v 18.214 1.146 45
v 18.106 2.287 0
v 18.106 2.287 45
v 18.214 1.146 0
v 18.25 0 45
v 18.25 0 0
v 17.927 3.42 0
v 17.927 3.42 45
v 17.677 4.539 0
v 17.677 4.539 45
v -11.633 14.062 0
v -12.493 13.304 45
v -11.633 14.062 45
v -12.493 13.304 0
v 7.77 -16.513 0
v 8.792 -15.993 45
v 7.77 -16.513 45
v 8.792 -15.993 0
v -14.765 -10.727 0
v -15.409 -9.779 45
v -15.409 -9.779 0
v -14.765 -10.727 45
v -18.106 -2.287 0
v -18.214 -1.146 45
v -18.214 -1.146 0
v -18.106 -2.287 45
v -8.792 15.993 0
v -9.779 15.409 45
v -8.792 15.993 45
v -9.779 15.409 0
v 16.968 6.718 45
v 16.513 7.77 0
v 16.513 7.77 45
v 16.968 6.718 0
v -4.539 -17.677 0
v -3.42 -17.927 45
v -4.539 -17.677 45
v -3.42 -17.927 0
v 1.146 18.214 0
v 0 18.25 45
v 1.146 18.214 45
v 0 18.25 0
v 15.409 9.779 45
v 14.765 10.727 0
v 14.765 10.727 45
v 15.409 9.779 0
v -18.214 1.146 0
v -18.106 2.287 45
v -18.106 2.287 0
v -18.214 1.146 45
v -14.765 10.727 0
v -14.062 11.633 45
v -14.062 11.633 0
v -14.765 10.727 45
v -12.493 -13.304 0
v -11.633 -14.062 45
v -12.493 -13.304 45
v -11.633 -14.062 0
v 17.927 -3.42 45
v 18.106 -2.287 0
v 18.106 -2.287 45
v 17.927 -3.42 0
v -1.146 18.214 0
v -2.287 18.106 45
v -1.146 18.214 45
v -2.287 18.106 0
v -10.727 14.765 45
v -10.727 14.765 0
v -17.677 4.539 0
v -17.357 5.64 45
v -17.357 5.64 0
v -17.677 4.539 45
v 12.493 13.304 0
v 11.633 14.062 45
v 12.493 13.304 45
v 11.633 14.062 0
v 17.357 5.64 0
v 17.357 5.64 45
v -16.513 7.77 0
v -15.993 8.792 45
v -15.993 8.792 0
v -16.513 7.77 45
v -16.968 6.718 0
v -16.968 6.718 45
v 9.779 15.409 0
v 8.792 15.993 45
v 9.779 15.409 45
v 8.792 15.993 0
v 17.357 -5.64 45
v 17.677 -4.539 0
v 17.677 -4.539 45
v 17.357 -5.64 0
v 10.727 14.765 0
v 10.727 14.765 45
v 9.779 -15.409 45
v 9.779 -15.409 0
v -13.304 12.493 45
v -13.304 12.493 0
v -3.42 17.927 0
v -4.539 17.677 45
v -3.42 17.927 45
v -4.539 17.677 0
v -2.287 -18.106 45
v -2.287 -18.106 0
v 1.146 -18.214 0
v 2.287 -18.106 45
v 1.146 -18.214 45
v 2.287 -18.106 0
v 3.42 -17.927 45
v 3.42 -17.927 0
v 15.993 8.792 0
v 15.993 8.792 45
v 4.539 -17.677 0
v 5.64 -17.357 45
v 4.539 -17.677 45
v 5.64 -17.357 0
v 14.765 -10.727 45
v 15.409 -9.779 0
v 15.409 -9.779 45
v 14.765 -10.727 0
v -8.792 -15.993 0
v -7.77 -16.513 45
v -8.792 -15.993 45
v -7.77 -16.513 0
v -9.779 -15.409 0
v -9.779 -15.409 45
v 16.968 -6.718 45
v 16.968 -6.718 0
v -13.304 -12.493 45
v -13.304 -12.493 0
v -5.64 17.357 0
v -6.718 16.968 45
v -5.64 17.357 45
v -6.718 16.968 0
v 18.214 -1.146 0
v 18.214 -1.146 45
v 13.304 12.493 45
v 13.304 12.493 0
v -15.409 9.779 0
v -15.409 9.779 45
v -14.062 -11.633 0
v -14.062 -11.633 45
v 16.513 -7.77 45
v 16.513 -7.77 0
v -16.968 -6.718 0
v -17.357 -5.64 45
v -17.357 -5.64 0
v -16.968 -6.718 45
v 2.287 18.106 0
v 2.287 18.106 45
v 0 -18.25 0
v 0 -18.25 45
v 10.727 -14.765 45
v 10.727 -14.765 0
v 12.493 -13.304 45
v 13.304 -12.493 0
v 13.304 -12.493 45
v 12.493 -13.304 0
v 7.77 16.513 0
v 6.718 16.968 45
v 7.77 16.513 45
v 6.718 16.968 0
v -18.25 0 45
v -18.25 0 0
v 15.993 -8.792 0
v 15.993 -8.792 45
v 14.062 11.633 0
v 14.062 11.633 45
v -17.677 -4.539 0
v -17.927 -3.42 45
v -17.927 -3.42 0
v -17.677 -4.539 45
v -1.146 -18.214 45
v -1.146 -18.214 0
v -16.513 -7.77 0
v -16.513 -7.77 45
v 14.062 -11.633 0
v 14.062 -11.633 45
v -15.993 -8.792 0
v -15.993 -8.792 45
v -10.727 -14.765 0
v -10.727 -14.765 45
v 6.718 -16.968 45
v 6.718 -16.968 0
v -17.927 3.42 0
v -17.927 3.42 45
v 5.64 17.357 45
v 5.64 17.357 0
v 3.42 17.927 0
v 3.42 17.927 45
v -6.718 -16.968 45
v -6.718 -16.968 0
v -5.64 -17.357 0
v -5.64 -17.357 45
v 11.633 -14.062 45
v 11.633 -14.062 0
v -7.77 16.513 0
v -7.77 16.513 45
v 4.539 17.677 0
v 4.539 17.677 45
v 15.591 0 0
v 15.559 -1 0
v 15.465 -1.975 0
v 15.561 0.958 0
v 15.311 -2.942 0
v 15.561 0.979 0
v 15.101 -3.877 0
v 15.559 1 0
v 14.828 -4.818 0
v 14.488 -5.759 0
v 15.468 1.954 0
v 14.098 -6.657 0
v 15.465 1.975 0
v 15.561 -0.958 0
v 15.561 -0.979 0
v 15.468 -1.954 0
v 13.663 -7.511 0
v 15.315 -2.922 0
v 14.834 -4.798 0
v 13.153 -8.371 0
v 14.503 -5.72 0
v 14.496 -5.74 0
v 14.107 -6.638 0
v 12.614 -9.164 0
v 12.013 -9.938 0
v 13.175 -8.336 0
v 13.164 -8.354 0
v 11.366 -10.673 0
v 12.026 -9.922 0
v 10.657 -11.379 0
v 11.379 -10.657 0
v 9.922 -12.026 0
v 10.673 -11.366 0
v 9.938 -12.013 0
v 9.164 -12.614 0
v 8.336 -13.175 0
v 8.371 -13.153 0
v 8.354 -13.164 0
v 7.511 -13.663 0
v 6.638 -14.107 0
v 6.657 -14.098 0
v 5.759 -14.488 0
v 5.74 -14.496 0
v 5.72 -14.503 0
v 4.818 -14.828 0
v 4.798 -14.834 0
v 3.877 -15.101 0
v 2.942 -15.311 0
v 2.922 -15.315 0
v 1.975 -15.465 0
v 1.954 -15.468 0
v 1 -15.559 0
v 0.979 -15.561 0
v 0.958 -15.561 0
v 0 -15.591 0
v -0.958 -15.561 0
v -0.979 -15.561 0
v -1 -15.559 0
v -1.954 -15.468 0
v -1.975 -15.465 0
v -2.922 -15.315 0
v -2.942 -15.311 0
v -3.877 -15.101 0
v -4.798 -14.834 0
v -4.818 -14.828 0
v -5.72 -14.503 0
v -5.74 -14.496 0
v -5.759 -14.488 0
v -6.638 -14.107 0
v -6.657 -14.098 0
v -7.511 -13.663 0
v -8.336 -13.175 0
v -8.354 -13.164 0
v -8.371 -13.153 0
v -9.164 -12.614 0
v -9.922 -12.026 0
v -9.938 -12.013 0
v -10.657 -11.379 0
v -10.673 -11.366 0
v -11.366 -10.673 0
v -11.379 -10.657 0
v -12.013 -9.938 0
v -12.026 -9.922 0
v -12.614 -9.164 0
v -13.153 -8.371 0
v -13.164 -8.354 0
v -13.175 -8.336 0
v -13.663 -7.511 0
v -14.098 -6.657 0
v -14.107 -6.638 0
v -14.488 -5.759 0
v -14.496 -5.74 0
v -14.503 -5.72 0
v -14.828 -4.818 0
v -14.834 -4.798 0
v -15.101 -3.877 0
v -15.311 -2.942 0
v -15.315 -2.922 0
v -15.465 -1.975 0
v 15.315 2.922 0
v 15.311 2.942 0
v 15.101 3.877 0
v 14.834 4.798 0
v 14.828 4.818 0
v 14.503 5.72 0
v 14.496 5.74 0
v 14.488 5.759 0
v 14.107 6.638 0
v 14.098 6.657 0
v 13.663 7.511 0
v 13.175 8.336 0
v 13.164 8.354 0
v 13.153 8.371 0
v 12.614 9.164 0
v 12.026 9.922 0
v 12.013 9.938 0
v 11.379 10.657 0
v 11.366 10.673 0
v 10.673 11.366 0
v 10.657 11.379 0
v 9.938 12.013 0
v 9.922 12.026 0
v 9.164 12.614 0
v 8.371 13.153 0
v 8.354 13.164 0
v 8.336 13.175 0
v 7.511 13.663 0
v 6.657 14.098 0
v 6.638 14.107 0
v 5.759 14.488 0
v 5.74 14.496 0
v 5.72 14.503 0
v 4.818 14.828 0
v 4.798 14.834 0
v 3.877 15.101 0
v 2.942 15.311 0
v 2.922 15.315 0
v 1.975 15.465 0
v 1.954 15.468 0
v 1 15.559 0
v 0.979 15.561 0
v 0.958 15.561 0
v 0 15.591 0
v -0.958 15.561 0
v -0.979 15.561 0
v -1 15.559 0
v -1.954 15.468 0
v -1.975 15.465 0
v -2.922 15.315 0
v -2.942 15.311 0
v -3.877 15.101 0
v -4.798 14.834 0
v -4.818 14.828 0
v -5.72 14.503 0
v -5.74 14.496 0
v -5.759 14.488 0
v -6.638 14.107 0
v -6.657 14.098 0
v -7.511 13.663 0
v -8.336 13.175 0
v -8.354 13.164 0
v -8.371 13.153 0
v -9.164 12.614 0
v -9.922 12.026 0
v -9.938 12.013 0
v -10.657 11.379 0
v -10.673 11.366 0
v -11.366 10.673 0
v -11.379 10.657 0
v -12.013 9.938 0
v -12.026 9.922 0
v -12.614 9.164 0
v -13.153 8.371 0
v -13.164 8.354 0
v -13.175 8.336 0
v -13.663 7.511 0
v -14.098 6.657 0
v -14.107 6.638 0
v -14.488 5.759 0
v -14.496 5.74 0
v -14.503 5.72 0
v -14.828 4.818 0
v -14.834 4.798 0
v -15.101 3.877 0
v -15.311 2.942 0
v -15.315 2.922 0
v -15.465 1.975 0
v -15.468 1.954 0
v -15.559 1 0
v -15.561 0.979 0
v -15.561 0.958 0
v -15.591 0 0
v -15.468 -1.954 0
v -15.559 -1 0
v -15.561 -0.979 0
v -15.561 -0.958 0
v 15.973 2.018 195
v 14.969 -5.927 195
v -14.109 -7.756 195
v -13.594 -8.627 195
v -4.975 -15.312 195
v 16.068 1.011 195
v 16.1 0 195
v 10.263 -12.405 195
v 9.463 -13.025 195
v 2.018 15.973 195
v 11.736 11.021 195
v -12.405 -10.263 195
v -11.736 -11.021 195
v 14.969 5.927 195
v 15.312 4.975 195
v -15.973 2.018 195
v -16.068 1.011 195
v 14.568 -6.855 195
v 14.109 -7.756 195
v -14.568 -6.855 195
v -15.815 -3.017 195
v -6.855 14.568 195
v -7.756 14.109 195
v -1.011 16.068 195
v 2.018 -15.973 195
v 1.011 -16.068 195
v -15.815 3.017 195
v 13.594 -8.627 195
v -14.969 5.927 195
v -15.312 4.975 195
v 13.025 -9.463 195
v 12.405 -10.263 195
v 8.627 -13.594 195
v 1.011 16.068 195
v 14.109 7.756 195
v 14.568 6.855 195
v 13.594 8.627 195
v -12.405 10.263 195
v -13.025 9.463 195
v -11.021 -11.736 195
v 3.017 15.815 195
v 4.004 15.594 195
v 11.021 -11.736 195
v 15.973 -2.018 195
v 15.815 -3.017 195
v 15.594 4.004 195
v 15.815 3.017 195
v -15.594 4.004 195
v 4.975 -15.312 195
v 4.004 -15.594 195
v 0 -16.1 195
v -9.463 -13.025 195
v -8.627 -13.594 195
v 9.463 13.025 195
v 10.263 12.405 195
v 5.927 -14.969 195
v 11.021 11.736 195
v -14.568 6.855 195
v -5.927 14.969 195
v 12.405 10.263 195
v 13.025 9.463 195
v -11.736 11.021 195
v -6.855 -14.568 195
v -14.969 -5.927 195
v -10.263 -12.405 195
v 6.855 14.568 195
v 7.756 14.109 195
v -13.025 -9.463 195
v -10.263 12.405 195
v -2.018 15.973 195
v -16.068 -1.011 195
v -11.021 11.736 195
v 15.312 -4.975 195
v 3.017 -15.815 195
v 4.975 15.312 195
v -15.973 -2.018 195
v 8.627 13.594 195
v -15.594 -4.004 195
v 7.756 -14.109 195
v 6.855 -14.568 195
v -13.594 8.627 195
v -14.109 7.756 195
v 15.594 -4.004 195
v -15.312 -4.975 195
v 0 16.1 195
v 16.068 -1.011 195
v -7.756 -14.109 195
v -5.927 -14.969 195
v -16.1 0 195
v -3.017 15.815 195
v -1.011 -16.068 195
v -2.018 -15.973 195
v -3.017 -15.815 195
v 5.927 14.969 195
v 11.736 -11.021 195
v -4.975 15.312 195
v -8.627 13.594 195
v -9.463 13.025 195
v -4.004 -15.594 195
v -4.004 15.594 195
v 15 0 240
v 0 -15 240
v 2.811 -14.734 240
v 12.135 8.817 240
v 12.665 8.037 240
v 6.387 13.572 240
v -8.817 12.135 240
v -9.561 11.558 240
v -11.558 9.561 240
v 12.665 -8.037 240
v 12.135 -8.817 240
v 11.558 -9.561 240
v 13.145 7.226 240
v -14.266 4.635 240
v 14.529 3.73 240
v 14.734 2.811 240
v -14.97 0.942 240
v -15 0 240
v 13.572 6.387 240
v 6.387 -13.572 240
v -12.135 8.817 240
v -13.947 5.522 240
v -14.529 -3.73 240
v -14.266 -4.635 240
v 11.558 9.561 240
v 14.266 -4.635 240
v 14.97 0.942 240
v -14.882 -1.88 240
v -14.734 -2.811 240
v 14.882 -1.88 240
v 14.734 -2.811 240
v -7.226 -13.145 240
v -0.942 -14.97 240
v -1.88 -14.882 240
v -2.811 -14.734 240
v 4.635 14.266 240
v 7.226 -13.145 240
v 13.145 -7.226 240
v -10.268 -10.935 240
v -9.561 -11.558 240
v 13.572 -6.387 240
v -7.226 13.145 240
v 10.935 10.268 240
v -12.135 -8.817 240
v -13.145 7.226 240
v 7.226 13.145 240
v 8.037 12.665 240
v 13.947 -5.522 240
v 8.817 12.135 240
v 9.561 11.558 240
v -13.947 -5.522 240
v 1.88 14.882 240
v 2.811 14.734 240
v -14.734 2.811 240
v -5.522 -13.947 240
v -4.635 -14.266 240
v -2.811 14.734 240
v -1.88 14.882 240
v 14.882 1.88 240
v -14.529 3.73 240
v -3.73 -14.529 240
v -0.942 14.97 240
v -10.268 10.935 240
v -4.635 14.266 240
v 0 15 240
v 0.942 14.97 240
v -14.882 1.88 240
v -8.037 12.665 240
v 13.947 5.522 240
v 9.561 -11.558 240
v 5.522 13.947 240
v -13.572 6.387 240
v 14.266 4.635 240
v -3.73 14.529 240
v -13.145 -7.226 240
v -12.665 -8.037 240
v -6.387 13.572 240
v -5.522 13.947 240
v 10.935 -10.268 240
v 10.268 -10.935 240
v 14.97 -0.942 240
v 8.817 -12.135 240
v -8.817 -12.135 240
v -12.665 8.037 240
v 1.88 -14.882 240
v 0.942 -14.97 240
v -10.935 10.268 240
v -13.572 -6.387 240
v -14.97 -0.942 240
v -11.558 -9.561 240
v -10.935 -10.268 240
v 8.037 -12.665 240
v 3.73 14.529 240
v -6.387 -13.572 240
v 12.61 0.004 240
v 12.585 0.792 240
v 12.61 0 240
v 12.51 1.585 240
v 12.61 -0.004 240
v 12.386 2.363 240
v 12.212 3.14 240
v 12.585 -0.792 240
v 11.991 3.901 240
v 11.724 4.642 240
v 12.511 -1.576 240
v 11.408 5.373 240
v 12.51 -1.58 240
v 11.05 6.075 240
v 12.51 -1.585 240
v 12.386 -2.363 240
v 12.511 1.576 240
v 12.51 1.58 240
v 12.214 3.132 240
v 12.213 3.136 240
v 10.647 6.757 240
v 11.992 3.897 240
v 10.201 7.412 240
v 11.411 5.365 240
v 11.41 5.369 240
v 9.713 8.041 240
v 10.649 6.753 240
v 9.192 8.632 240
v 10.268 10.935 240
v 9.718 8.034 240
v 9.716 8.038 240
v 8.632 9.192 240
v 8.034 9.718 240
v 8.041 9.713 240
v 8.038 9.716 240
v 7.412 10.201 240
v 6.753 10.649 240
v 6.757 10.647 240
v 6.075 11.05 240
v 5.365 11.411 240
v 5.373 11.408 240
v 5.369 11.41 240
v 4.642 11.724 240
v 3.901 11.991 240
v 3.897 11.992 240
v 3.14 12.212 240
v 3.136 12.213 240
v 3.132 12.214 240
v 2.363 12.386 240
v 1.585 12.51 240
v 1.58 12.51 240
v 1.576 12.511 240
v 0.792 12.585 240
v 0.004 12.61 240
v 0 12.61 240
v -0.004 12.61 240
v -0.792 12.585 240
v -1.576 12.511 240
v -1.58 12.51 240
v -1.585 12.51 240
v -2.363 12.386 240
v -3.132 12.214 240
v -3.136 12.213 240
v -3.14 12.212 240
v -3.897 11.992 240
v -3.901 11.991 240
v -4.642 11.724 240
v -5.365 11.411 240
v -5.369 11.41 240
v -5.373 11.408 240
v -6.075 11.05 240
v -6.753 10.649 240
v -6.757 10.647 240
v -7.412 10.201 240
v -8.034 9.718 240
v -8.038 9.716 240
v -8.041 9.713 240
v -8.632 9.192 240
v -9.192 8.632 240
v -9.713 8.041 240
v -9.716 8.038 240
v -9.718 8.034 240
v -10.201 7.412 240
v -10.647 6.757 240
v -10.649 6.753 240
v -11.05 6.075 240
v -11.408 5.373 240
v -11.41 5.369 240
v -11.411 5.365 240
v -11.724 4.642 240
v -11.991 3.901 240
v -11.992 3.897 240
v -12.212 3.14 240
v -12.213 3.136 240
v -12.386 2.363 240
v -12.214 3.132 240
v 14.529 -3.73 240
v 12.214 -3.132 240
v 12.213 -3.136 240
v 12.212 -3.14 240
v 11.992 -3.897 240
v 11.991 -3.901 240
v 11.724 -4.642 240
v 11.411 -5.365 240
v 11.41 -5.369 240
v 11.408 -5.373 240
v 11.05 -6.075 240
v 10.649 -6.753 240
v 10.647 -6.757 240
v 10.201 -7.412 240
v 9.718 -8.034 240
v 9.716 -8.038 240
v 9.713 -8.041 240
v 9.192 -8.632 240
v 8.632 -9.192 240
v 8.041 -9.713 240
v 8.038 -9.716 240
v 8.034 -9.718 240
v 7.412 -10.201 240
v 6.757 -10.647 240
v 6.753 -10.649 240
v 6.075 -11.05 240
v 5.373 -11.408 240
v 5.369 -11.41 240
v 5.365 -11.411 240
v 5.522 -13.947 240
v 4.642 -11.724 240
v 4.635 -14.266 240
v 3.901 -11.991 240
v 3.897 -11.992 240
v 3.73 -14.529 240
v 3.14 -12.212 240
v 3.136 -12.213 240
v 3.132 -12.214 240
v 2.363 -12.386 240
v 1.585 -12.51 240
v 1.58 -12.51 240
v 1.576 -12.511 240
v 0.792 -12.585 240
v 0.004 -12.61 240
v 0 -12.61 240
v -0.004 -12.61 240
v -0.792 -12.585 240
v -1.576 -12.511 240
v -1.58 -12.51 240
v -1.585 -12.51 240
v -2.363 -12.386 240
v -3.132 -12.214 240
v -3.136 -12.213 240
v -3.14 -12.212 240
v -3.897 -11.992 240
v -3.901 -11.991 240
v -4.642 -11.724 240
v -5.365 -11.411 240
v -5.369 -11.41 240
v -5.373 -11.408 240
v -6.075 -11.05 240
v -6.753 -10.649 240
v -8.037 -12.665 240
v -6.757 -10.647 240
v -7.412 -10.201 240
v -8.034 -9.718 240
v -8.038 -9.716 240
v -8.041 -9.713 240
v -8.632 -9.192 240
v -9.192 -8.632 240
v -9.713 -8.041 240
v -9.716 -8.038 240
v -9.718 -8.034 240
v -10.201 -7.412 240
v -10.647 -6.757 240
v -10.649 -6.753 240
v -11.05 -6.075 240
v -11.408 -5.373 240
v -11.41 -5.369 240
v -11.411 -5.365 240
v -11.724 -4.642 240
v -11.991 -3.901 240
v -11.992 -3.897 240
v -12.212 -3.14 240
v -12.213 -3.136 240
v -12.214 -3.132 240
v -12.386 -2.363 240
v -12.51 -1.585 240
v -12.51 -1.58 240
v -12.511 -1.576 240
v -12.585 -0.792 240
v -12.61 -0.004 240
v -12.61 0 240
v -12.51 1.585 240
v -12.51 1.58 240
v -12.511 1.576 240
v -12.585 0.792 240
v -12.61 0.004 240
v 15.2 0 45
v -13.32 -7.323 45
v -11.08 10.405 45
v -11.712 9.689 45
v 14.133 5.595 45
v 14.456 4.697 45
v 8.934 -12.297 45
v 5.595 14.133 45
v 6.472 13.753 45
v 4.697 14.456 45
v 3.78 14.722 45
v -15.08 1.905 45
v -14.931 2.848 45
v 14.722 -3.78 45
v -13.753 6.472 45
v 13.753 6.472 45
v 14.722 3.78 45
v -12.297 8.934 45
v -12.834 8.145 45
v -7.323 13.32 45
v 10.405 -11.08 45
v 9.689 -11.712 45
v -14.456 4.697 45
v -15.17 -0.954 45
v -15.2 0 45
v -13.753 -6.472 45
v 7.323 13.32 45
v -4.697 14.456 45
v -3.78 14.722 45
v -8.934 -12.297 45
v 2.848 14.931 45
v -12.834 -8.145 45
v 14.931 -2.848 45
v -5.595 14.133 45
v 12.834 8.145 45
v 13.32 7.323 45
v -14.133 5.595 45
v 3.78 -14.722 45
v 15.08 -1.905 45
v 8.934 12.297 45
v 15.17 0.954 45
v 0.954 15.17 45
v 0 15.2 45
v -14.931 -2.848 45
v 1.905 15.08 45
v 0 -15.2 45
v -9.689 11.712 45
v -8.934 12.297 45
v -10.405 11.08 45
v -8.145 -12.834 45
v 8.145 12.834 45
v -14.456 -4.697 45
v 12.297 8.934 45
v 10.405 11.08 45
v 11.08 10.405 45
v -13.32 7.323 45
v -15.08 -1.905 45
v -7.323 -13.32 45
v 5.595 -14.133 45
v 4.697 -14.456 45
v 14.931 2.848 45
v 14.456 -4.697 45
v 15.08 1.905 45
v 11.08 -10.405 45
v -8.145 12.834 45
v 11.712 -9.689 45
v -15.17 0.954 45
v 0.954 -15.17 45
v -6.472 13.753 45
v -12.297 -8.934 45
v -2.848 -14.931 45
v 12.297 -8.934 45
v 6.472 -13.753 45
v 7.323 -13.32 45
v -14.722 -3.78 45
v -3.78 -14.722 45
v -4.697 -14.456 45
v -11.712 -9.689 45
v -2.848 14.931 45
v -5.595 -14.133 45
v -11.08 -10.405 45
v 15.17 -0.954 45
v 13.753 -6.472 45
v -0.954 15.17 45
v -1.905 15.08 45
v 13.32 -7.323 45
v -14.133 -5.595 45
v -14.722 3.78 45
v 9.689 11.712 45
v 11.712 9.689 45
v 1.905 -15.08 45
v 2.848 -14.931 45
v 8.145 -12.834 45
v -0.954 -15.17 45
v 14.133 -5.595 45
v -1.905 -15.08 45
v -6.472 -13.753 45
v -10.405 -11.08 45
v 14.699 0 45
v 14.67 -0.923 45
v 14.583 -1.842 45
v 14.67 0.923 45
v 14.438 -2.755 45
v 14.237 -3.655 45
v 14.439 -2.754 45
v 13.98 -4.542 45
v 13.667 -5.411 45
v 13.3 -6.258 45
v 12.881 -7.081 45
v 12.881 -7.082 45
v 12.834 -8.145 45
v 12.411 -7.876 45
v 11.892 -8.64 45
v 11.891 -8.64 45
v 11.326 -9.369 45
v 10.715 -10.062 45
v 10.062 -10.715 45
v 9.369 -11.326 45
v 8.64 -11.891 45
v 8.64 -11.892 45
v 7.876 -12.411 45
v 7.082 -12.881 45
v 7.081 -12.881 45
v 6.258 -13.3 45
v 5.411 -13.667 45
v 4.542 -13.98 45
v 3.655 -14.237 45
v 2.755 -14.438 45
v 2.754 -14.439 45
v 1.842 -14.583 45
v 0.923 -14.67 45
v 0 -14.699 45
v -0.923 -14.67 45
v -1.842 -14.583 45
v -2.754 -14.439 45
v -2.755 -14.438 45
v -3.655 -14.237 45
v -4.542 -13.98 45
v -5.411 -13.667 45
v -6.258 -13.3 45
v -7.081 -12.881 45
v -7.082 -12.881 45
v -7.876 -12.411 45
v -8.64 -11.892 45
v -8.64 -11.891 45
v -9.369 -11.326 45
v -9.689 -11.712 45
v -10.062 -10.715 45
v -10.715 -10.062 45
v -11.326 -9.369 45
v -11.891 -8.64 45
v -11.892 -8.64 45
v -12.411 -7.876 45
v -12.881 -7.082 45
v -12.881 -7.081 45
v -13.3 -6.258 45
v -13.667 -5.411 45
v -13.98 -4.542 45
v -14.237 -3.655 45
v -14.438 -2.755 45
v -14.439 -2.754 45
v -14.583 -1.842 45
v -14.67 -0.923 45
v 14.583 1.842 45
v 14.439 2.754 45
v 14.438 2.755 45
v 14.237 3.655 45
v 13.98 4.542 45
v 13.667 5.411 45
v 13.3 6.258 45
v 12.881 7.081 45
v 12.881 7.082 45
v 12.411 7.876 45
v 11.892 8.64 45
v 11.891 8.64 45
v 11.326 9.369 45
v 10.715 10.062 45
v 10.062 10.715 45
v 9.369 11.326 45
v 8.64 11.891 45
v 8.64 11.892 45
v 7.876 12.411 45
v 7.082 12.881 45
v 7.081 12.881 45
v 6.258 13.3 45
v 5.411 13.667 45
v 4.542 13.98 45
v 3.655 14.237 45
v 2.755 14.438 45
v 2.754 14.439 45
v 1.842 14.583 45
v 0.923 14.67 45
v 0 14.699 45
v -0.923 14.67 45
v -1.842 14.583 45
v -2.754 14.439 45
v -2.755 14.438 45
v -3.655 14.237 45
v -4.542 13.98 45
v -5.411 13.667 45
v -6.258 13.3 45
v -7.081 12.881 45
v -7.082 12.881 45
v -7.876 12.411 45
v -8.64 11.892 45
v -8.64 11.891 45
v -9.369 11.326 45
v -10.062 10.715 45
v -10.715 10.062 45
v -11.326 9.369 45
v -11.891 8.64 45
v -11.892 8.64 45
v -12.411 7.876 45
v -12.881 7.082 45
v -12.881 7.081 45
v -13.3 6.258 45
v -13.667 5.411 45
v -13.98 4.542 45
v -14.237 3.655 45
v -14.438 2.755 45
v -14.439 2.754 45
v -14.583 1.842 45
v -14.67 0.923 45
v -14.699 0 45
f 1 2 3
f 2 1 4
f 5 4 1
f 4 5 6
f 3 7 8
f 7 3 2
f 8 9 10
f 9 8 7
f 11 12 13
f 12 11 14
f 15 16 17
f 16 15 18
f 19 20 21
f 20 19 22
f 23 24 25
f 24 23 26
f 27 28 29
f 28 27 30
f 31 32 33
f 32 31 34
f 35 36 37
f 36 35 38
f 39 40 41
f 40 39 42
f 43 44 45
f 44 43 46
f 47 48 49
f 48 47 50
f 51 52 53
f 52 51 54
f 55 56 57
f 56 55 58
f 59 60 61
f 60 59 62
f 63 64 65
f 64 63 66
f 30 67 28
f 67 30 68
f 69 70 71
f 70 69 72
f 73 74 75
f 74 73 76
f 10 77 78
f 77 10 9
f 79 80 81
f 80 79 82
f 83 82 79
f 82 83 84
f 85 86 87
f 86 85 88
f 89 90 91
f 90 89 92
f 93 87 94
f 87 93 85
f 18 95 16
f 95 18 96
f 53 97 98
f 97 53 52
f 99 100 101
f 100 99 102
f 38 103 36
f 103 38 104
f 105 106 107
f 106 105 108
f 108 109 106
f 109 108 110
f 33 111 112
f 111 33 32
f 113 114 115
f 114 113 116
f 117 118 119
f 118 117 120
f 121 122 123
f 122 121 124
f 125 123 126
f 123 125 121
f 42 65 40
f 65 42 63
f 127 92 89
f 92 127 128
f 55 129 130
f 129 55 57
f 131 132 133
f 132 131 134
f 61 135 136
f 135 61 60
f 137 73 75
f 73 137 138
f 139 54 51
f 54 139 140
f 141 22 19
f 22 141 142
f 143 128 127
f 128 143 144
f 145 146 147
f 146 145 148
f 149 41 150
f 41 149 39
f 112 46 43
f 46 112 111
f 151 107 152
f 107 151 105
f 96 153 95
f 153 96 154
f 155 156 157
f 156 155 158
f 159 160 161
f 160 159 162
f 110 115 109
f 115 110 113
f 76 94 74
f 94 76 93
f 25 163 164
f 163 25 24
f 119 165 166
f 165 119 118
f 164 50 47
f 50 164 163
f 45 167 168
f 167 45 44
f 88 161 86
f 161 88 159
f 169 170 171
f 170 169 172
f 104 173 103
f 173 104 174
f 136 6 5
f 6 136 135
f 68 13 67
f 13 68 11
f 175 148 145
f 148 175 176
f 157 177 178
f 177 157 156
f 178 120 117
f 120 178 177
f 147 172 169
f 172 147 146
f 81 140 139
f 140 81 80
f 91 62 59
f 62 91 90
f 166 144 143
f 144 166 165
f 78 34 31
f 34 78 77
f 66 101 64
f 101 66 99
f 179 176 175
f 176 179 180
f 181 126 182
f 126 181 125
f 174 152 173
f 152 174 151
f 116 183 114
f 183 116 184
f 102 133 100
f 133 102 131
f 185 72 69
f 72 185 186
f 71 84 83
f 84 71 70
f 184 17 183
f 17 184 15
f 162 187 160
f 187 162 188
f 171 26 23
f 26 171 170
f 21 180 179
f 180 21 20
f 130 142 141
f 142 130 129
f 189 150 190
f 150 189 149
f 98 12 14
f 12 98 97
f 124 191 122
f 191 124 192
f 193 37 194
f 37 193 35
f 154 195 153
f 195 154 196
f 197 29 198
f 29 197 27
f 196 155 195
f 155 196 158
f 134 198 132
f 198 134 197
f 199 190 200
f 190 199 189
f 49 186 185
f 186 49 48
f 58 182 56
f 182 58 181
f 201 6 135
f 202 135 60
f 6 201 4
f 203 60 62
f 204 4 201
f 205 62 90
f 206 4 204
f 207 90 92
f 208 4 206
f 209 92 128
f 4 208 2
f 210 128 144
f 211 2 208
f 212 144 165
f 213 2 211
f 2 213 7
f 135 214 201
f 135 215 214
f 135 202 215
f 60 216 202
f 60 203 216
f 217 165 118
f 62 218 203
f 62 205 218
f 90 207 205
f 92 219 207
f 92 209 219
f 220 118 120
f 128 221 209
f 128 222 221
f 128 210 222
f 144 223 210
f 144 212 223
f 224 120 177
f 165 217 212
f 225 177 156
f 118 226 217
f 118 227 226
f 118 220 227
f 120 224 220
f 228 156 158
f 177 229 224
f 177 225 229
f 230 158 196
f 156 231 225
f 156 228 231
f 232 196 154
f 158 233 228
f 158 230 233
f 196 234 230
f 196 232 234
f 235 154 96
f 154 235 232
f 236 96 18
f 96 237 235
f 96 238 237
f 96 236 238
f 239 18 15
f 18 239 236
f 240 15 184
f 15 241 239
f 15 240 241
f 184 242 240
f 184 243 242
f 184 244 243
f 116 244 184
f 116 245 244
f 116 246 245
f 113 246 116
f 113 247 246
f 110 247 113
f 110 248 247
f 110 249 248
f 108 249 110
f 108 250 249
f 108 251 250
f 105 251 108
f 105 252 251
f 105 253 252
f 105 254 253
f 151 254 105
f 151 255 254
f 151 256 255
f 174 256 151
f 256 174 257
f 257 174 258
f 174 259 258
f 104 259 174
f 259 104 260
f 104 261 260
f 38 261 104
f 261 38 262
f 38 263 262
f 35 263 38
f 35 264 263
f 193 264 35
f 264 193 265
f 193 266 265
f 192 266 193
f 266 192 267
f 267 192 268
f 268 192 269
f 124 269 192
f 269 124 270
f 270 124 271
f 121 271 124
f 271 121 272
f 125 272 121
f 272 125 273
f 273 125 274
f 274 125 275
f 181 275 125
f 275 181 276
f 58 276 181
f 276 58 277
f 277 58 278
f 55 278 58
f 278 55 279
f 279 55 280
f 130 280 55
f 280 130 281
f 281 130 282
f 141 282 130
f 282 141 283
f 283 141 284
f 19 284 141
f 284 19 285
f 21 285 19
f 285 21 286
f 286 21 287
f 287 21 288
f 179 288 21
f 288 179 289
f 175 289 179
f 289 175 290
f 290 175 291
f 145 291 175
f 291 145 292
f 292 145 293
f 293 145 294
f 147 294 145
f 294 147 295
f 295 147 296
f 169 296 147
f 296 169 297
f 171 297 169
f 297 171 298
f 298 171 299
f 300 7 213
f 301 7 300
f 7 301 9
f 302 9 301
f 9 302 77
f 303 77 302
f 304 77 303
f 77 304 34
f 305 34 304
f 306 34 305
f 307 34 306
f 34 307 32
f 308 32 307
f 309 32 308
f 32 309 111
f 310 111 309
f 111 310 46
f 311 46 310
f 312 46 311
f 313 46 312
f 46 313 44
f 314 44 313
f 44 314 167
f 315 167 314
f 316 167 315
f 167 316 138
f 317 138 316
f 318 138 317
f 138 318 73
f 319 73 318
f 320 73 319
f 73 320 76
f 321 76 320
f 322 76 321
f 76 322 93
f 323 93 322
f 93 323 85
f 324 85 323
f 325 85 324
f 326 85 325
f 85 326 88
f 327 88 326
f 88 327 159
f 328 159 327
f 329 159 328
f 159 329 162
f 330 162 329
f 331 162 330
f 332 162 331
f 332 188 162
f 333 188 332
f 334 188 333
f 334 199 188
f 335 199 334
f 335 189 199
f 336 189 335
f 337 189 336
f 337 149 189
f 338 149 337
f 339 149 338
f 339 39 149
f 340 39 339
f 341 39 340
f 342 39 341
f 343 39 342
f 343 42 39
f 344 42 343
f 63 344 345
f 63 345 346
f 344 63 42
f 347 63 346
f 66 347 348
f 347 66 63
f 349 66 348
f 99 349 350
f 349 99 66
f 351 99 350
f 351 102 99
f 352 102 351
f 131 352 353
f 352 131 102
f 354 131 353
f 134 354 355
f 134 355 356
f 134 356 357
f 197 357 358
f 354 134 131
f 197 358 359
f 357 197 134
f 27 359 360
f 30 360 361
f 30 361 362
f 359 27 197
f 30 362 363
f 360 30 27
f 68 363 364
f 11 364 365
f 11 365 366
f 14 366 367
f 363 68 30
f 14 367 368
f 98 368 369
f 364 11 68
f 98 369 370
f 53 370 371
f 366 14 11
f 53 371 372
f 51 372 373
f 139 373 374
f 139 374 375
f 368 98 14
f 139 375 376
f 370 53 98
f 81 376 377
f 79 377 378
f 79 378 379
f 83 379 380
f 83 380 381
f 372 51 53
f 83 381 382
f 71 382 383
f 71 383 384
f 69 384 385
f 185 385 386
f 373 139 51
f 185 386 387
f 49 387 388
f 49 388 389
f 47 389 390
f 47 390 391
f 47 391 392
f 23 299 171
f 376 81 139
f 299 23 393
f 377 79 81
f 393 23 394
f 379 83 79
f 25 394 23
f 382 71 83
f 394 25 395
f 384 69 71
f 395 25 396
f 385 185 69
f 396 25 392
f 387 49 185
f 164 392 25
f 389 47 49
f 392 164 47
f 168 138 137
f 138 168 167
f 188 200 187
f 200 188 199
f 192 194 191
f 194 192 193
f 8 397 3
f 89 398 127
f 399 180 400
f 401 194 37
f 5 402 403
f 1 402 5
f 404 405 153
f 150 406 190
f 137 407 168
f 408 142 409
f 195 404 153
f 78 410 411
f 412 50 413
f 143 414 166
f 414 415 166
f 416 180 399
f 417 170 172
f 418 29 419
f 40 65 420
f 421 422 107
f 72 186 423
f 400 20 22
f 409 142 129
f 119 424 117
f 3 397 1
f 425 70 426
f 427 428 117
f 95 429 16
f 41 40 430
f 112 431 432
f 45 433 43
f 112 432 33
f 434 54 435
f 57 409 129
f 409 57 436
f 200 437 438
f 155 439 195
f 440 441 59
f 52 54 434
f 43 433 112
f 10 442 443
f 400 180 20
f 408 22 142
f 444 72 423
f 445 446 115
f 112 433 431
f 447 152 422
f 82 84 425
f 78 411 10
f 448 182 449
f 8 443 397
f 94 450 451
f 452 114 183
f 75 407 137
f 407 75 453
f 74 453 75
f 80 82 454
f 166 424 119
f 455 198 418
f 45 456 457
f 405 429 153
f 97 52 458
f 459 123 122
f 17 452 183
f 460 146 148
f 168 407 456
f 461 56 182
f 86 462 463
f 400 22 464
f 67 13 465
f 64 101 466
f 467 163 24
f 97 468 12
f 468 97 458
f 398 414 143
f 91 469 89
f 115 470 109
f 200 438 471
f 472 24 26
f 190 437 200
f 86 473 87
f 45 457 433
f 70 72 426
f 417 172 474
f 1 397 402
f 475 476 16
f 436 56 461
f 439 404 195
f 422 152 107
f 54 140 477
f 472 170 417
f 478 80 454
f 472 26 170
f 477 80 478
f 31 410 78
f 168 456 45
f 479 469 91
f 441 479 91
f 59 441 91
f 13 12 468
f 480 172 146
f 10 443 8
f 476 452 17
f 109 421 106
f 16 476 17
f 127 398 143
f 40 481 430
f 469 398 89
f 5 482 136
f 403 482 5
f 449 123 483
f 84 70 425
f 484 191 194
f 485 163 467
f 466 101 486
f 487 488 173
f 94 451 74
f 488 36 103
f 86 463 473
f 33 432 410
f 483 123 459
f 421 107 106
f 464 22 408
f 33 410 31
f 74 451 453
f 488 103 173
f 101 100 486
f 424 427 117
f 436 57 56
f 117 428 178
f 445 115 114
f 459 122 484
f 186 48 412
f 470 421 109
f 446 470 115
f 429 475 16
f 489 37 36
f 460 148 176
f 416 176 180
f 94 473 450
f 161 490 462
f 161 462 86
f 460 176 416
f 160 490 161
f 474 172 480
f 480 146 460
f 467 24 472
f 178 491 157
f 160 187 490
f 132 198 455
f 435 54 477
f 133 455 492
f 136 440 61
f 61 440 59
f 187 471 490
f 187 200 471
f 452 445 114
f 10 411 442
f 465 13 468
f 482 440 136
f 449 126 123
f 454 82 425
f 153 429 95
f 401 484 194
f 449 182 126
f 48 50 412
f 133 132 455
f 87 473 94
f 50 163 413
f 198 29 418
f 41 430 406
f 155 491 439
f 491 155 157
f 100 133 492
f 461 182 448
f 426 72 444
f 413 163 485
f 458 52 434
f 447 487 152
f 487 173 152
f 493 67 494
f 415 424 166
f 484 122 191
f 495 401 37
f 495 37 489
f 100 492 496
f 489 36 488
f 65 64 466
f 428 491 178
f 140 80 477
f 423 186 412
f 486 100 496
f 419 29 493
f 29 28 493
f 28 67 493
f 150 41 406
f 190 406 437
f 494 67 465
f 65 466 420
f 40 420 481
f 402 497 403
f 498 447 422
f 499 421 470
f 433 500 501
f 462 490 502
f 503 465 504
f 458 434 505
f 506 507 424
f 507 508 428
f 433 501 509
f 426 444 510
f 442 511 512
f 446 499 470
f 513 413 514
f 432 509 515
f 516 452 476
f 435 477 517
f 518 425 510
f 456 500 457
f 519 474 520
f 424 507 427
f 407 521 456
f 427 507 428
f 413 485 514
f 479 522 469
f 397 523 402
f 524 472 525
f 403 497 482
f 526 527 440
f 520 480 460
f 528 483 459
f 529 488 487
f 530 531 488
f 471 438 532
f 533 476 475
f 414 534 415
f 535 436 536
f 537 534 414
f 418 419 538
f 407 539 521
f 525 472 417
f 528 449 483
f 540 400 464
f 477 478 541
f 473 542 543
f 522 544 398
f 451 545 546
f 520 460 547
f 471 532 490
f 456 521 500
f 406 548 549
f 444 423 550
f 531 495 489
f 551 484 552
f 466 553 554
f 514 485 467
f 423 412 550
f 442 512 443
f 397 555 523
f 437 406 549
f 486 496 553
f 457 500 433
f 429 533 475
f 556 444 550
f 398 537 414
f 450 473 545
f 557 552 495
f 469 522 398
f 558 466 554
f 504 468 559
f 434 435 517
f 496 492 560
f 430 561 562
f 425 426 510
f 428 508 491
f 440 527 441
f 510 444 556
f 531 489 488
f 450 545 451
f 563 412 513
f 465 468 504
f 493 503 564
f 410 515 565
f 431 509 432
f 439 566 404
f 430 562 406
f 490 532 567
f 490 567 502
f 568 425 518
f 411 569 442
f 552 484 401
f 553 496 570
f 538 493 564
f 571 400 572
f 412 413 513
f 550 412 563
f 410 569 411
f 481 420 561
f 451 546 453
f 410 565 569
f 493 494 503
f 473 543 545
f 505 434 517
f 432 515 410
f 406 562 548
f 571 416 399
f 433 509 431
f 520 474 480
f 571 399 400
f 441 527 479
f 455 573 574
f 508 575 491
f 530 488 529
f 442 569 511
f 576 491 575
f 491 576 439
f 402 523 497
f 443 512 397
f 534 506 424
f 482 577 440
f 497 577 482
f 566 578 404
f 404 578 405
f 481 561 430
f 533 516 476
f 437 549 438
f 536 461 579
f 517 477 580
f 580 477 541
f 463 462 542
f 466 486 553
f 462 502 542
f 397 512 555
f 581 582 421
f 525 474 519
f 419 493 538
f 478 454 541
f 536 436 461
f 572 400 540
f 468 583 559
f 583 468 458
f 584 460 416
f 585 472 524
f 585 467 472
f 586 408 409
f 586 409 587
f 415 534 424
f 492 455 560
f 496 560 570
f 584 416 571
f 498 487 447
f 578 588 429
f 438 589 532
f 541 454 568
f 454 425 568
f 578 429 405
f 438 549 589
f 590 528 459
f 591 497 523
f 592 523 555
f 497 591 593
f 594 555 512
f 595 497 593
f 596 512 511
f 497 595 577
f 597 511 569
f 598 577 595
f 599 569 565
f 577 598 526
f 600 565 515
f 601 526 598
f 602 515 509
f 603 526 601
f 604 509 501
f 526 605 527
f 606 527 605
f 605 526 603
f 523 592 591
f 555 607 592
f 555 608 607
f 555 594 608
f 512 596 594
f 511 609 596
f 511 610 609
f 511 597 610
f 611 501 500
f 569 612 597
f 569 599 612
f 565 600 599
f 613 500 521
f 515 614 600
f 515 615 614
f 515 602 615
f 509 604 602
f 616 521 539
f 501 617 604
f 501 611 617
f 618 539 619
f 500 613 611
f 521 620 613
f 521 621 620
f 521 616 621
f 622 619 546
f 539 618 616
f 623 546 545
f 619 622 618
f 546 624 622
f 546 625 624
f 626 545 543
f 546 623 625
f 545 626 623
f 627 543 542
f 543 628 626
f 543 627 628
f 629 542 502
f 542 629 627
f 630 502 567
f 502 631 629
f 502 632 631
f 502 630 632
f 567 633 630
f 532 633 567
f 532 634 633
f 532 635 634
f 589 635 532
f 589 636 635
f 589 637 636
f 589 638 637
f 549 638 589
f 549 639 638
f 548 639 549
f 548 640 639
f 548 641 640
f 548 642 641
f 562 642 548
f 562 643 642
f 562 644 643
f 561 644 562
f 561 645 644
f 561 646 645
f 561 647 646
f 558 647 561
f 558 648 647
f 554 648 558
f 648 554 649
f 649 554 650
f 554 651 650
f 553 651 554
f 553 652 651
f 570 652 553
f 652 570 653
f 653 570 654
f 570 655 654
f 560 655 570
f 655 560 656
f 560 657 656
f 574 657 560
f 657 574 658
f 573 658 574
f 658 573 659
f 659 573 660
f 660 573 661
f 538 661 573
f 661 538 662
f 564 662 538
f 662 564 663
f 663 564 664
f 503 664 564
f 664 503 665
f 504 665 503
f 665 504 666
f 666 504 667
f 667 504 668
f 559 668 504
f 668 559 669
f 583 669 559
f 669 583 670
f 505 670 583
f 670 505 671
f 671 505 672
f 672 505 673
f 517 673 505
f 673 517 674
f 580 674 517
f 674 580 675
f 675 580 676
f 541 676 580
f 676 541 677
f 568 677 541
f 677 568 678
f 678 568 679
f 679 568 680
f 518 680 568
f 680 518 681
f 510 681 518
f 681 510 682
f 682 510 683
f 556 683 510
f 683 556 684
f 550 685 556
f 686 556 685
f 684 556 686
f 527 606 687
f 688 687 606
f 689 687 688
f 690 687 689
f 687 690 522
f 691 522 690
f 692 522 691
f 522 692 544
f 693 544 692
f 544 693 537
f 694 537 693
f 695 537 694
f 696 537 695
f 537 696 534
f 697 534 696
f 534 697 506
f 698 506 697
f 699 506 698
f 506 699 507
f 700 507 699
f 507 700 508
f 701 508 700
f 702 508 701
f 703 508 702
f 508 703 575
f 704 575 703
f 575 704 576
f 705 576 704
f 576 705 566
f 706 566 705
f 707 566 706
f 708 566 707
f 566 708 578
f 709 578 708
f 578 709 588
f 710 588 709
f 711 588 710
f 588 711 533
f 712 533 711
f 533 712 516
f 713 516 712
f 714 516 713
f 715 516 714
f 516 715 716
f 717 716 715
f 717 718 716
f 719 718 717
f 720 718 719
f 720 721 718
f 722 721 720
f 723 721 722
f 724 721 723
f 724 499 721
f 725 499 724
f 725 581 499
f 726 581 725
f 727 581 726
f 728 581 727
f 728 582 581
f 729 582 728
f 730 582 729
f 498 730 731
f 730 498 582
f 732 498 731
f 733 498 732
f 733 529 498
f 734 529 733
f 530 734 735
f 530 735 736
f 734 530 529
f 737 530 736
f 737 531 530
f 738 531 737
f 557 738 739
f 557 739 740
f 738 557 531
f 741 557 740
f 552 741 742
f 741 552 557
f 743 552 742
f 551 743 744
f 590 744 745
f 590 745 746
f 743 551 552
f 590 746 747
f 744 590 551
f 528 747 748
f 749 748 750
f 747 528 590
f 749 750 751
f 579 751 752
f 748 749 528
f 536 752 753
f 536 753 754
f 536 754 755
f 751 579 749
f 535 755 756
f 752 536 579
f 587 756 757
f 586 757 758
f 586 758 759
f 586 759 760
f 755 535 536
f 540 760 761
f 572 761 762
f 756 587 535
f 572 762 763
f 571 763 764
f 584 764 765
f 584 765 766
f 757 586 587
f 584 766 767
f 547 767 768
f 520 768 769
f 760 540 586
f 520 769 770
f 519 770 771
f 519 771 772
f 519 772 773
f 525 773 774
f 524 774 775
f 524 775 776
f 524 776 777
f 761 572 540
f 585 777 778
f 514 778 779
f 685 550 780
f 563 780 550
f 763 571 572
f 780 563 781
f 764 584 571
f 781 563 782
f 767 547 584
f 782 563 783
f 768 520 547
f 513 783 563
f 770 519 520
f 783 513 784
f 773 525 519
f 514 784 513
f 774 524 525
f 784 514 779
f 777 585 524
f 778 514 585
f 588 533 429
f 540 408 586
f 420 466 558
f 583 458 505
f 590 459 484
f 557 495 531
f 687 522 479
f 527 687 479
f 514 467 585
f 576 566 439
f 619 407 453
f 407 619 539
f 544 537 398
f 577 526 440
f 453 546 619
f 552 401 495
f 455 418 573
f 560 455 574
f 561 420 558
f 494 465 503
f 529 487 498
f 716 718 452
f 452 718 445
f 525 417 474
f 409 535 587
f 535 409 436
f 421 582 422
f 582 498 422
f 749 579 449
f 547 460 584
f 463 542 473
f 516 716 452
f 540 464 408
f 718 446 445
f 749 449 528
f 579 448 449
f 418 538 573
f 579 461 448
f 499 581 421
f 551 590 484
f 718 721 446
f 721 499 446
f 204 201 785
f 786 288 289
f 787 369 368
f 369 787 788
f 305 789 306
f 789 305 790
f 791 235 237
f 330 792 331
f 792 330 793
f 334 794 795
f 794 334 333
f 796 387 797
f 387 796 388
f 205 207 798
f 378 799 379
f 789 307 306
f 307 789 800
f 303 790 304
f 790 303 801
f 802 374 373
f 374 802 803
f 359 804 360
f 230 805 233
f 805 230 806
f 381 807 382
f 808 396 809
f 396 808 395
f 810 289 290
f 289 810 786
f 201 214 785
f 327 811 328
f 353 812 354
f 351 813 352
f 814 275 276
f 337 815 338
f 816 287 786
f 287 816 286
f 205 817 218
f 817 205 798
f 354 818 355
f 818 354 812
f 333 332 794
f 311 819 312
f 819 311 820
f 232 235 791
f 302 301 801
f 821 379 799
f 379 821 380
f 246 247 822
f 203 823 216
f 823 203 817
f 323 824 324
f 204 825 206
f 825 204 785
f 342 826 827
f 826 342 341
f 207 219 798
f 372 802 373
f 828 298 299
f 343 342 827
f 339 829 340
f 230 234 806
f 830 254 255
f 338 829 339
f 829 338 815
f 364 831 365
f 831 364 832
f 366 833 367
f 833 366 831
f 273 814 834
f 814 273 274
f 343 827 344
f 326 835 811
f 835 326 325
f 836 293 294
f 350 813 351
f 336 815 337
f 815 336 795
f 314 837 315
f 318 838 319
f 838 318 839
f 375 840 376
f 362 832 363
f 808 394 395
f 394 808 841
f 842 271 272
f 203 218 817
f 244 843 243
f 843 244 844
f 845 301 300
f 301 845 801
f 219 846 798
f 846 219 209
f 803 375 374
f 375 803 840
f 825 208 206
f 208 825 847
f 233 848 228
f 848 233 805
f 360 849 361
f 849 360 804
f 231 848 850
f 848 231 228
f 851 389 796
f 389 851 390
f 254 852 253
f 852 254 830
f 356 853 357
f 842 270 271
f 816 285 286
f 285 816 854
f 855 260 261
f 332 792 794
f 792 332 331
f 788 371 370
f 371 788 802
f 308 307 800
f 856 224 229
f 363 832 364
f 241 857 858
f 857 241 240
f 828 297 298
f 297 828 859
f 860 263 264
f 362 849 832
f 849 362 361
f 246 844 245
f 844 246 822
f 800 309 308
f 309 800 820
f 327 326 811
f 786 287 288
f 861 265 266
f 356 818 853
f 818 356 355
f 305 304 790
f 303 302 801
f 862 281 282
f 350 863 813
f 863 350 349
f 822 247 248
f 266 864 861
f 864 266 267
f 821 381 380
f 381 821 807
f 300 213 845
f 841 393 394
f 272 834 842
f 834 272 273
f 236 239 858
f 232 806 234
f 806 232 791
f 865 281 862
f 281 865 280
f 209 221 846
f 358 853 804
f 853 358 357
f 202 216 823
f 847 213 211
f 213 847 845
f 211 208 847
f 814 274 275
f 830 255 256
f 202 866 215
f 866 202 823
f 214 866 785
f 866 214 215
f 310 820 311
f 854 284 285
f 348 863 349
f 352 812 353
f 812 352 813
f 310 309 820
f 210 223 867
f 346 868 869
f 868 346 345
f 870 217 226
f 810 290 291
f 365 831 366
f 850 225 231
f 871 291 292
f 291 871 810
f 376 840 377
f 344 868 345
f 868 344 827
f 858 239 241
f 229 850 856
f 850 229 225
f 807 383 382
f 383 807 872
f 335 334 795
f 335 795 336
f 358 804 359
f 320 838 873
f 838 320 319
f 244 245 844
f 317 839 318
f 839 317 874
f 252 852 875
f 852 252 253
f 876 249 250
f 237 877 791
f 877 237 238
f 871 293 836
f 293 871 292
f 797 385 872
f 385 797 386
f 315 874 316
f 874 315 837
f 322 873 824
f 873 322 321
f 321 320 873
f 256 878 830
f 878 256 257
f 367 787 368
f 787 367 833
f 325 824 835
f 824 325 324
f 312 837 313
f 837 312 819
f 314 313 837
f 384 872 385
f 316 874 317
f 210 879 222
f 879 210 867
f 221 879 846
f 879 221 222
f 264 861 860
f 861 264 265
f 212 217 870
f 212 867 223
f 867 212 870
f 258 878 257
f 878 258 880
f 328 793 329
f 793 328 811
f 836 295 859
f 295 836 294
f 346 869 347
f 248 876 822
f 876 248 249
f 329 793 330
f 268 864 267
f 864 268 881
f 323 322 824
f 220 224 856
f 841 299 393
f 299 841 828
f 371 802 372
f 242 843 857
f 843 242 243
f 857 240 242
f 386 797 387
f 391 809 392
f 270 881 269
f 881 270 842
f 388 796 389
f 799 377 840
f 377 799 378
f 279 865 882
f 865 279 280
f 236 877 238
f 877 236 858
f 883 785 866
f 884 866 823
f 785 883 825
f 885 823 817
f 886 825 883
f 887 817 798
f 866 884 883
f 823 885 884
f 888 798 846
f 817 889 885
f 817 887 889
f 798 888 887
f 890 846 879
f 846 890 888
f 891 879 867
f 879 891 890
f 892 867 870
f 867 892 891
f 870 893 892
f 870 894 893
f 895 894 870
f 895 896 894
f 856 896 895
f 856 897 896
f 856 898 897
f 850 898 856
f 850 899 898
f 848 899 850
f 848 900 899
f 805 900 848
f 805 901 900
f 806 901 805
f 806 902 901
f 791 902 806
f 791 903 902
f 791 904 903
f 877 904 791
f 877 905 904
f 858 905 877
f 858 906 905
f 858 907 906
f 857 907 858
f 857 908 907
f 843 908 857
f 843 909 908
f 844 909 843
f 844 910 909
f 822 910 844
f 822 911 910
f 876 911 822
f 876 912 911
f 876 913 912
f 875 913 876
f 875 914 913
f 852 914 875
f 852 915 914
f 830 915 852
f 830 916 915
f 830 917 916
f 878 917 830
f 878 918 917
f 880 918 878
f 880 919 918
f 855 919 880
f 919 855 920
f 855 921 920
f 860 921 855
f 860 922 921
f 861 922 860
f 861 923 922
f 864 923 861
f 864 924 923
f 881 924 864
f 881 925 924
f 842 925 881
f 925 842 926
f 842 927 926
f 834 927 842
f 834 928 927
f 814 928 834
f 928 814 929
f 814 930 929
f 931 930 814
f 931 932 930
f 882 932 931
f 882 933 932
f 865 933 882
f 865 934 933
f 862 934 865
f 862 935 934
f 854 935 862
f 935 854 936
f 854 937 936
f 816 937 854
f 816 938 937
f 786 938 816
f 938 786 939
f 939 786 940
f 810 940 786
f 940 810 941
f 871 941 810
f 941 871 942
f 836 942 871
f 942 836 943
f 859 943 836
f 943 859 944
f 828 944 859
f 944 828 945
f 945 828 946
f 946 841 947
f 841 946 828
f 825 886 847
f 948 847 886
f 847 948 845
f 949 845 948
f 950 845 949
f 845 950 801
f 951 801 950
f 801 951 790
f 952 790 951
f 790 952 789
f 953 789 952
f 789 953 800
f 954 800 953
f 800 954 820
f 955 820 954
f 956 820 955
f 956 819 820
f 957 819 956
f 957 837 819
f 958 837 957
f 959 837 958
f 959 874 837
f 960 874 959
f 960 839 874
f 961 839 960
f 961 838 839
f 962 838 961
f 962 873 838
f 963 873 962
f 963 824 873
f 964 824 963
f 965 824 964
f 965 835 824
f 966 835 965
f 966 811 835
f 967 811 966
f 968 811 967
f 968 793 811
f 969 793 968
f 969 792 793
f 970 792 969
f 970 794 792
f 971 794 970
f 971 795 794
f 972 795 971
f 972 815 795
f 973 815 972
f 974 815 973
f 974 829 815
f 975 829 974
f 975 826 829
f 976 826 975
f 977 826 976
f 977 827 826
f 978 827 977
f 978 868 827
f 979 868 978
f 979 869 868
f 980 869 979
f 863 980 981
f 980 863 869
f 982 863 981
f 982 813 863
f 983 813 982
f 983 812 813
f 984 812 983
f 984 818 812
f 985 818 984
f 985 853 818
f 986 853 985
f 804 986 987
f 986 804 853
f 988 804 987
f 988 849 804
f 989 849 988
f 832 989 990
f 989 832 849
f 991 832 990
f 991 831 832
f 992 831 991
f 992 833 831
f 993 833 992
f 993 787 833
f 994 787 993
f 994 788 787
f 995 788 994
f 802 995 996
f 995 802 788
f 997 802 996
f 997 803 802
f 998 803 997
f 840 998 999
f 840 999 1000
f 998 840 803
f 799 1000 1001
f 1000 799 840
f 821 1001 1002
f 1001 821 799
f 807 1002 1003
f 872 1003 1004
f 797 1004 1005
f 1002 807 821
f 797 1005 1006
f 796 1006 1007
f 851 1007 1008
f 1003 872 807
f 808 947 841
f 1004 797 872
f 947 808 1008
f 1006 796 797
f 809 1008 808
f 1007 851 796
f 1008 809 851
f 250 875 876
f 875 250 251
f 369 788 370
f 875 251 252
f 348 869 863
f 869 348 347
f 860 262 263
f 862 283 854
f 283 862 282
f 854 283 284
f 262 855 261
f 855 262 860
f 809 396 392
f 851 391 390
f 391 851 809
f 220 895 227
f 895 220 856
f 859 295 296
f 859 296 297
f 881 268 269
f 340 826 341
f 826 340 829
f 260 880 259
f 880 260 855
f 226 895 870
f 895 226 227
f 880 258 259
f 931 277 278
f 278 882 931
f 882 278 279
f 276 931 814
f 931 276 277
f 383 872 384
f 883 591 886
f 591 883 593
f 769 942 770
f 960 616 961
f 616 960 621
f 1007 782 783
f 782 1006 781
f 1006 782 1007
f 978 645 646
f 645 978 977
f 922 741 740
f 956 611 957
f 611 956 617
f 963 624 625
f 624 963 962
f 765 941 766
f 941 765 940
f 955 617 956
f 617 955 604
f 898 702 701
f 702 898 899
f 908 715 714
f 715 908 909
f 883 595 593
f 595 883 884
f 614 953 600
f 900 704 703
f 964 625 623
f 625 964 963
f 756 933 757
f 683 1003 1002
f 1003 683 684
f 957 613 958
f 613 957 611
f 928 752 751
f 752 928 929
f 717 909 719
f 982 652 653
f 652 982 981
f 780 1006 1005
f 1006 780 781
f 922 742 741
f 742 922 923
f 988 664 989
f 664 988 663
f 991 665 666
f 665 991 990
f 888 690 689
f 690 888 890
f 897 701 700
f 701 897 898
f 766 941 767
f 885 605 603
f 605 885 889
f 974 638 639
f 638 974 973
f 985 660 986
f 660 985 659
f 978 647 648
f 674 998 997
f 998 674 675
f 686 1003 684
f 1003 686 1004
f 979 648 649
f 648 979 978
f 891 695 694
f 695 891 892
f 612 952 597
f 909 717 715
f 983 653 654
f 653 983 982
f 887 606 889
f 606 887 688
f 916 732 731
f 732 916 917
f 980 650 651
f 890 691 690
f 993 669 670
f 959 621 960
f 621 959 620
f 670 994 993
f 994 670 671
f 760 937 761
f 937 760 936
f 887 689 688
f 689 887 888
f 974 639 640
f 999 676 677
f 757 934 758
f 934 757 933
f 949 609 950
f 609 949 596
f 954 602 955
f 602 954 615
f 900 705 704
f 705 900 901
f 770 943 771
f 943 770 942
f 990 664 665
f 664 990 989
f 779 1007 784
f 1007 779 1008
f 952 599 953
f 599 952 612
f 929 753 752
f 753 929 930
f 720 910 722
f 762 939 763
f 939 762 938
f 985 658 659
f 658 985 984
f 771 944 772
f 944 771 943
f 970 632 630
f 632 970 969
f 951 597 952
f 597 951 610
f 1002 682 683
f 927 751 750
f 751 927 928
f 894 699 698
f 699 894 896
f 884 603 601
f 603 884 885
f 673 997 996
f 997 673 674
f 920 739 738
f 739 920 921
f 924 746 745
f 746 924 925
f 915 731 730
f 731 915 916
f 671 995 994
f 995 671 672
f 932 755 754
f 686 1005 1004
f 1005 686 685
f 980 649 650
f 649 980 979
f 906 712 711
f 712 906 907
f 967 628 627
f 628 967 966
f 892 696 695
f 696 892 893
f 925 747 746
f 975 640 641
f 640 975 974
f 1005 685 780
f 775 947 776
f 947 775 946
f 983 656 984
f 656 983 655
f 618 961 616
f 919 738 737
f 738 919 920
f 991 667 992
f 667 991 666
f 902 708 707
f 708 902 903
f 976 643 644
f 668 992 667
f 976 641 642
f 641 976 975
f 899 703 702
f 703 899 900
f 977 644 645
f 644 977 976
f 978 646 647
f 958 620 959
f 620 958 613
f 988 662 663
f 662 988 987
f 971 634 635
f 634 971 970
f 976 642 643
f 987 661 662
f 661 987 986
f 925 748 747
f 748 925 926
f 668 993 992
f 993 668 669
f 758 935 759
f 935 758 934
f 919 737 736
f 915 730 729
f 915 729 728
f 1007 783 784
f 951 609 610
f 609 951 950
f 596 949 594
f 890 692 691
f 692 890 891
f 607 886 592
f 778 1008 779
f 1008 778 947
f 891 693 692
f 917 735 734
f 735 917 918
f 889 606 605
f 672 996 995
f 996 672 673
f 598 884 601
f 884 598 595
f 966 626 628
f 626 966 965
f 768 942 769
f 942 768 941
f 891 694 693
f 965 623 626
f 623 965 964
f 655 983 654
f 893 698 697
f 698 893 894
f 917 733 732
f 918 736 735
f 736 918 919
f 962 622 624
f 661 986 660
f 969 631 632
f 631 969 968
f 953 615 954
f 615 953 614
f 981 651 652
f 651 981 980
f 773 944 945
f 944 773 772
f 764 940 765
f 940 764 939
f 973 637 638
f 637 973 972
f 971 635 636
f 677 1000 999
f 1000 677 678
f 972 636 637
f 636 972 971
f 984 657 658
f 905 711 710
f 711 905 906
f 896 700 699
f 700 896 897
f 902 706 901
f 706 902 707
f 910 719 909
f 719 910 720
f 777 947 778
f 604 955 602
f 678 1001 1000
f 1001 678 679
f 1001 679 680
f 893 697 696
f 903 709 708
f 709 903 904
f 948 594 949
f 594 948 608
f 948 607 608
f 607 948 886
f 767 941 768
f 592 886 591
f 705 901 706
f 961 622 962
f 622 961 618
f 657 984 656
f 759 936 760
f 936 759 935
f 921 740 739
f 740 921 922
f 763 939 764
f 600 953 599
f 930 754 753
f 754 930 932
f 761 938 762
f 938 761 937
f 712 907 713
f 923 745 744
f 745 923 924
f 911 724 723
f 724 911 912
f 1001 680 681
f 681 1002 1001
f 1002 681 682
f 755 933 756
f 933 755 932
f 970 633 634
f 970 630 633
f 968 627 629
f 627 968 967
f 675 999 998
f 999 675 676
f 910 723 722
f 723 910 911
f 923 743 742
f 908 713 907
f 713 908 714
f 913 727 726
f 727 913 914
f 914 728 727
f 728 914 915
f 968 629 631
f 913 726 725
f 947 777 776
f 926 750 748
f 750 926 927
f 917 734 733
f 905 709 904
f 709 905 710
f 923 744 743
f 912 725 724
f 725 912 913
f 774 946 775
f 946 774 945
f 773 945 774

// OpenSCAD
// --- THE "NO-FAIL" OVERNIGHT WAND (240mm) ---
total_length = 240;      
insertion_depth = 45;   

// Wide End (Hose Side)
wide_od = 36.5; 
wide_id_entrance = 31.2; // Slightly wider entrance
wide_id_bottom = 30.4;   // Slightly wider bottom for guaranteed fit

// Narrow End (Floor Tool Side)
narrow_tip_od = 30.0;   
narrow_base_od = 32.2;  

narrow_id = 25.2;

$fn = 100;

difference() {
    union() {
        cylinder(h = insertion_depth, d = wide_od);
        translate([0, 0, insertion_depth])
            cylinder(h = total_length - (insertion_depth * 2), d1 = wide_od, d2 = narrow_base_od);
        translate([0, 0, total_length - insertion_depth])
            cylinder(h = insertion_depth, d1 = narrow_base_od, d2 = narrow_tip_od);
    }
    union() {
        translate([0, 0, -1]) 
            cylinder(h = insertion_depth + 1, d1 = wide_id_entrance, d2 = wide_id_bottom);
        translate([0, 0, insertion_depth - 0.1])
            cylinder(h = total_length - insertion_depth + 1, d1 = wide_id_bottom - 1, d2 = narrow_id);
    }
}
